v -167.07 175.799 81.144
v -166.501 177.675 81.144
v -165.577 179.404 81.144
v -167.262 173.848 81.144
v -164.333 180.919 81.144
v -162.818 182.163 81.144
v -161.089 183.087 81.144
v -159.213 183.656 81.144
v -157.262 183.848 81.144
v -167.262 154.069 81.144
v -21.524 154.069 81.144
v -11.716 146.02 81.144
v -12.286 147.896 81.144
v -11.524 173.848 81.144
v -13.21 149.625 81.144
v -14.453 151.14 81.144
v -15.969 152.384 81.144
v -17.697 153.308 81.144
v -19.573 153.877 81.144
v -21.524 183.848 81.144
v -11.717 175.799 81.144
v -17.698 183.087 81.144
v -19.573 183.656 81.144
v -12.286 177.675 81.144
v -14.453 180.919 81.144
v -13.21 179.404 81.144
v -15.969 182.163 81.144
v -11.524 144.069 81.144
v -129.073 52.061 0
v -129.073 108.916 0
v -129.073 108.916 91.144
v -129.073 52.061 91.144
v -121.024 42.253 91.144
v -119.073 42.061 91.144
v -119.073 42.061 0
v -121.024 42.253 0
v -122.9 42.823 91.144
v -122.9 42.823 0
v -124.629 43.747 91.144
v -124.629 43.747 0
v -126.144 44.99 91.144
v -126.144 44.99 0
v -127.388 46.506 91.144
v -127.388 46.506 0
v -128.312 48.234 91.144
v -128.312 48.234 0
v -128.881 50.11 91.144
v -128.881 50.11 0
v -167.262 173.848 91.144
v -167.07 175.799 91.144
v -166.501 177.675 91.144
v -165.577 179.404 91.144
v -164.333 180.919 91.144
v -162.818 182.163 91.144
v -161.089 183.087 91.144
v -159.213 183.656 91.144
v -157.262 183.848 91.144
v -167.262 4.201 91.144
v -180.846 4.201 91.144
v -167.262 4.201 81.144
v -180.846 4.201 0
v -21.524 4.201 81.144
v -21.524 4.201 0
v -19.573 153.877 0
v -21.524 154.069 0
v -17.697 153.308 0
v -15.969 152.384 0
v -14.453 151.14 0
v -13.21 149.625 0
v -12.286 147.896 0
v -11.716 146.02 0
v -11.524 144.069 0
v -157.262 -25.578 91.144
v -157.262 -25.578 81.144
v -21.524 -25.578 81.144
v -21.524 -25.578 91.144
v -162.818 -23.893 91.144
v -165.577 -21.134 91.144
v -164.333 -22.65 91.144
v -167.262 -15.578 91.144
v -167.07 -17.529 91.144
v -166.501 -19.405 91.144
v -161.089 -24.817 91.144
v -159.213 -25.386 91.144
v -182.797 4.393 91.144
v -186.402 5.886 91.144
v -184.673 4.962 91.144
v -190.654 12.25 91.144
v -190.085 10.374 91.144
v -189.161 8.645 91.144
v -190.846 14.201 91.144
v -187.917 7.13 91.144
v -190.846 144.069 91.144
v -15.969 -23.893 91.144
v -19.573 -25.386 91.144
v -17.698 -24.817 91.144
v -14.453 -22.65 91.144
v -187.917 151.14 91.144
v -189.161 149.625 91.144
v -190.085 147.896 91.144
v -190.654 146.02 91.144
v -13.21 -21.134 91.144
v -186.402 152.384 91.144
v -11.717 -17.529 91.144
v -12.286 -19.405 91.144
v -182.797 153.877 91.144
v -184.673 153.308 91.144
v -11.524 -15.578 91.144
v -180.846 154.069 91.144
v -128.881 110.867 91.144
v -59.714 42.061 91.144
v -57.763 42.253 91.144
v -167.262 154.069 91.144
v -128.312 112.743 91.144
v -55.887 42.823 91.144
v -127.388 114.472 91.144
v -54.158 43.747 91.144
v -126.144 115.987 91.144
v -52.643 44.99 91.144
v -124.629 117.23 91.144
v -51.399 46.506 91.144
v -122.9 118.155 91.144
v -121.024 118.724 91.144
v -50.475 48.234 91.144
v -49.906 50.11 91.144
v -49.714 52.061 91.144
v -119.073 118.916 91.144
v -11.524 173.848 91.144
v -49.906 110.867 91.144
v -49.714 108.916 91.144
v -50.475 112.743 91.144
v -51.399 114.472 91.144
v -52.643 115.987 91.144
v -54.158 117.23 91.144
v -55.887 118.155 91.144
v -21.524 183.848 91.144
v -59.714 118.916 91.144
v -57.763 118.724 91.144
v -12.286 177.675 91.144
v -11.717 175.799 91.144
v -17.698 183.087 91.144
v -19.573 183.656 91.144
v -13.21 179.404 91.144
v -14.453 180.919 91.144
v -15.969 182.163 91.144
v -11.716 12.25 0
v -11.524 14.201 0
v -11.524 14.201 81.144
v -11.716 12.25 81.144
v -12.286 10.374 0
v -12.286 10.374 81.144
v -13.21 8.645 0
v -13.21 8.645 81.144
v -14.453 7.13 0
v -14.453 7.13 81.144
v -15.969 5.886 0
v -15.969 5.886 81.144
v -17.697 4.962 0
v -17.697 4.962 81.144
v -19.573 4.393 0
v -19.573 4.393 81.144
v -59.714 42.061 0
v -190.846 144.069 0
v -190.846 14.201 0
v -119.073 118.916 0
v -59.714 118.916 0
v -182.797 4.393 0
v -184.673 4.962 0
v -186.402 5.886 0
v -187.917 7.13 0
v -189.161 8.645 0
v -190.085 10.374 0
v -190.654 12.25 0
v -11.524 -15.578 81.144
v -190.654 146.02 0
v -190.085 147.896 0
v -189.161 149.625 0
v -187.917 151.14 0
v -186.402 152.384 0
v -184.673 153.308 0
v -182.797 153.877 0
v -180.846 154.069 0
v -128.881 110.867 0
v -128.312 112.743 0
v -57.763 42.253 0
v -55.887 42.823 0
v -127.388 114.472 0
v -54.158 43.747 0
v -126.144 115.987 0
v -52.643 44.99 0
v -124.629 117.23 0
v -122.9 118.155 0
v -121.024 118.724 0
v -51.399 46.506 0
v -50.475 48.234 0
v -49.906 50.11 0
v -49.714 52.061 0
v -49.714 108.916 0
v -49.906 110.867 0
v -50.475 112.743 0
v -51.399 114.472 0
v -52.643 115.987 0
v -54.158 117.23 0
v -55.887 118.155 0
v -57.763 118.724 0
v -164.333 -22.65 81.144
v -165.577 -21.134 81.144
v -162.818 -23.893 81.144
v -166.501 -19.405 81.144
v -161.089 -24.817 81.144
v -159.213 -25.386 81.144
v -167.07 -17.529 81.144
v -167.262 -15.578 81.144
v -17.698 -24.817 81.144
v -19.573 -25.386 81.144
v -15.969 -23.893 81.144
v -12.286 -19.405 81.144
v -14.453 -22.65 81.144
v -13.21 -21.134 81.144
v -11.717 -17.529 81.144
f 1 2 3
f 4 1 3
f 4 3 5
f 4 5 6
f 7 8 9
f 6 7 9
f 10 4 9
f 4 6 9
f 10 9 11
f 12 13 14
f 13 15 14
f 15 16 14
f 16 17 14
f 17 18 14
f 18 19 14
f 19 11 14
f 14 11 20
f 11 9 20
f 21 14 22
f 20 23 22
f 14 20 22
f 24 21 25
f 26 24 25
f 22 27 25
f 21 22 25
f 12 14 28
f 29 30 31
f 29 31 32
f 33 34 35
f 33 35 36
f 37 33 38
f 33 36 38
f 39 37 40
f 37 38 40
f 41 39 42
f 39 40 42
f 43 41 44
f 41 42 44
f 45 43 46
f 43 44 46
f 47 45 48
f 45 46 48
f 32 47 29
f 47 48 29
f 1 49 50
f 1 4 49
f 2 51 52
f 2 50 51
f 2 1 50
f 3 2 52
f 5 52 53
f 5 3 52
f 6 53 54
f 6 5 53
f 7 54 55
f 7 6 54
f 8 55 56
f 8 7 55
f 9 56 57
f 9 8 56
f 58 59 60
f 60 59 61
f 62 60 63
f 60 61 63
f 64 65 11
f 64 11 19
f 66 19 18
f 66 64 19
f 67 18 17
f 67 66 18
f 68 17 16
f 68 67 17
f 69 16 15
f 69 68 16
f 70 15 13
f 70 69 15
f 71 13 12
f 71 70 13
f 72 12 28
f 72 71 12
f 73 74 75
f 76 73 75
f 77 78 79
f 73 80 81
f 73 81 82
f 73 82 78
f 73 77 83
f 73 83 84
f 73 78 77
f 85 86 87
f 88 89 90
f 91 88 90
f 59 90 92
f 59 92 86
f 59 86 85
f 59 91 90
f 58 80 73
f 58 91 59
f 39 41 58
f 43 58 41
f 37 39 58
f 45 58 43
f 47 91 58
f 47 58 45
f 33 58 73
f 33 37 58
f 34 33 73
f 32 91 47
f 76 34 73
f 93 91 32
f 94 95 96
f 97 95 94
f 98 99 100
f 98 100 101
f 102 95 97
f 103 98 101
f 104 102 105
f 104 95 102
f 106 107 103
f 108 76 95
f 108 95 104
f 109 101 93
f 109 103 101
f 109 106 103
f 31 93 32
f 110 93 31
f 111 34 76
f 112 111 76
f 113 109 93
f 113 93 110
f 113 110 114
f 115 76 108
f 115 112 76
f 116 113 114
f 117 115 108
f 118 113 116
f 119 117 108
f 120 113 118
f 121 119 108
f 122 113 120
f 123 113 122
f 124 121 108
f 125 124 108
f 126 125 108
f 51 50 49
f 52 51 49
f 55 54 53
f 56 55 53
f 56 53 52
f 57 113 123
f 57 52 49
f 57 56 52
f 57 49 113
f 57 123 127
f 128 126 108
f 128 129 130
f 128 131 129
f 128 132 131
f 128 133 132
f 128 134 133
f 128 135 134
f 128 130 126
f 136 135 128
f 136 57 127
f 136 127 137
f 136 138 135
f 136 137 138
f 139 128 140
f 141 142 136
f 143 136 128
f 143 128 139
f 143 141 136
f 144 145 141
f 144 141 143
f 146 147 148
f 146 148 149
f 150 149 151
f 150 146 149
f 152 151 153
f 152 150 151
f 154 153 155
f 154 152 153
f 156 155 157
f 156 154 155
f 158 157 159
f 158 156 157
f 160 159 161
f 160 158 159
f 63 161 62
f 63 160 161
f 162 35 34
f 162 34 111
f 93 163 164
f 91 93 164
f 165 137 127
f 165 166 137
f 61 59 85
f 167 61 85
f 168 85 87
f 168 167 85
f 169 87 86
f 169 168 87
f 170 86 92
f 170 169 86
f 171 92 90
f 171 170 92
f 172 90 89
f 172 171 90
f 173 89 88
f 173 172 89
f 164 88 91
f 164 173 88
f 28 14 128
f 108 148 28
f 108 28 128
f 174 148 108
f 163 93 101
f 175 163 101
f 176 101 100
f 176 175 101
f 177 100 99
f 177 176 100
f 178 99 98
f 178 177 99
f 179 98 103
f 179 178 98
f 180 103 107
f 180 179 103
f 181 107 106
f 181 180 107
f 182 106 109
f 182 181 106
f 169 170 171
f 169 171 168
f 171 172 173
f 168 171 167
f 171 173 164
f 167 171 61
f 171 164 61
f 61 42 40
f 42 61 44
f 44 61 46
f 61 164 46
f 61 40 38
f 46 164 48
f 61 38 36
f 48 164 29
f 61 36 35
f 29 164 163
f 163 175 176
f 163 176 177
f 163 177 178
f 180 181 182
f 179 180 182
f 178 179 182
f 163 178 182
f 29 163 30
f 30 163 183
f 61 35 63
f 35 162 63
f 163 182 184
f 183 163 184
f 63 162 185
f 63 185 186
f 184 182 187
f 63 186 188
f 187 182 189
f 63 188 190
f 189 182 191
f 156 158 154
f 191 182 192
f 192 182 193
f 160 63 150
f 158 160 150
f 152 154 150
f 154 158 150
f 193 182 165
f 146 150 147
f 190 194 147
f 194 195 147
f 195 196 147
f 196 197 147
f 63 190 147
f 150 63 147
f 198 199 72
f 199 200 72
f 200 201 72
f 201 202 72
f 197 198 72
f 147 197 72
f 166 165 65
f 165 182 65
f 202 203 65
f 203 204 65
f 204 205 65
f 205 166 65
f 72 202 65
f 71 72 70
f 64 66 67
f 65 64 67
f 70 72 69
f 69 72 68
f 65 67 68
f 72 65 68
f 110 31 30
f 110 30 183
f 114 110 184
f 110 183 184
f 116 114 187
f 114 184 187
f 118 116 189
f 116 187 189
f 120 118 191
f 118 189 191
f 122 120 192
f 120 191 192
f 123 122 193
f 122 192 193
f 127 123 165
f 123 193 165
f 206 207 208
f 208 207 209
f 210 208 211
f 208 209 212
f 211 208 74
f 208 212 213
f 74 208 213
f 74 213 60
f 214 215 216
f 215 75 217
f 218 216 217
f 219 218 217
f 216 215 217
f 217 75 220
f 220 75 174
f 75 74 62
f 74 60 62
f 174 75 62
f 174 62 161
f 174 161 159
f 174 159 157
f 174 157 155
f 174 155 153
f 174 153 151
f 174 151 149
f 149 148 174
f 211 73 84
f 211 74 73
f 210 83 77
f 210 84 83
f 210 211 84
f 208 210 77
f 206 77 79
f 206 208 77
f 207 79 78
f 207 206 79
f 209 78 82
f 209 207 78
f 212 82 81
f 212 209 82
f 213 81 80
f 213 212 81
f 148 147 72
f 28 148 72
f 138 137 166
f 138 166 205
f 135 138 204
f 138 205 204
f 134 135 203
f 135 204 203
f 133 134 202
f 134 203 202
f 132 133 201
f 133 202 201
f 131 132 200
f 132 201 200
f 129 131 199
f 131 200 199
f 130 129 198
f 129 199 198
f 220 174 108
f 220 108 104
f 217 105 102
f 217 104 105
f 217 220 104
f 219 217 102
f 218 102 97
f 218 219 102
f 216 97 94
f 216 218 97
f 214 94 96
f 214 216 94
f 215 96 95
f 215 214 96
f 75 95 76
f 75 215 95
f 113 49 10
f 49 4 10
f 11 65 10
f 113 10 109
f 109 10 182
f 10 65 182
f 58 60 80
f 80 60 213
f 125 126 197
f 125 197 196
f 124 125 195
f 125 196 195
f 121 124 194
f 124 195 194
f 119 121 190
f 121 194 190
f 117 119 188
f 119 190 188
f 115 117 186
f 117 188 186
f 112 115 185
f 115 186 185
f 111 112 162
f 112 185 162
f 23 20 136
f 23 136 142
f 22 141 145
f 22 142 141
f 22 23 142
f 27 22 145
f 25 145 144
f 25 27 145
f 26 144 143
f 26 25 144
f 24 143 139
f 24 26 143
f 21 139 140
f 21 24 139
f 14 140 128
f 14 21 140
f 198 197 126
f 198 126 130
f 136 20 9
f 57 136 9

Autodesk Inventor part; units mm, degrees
ref_plane "YZ Plane" through (0, 0, 0) normal (1, 0, 0) x (0, 1, 0)
ref_plane "XZ Plane" through (0, 0, 0) normal (0, 1, 0) x (-1, 0, 0)
ref_plane "XY Plane" through (0, 0, 0) normal (0, 0, 1) x (1, 0, 0)
ref_plane "Work Plane1" through (0, 0, 0) normal (0, 0, 1) x (1, 0, 0)
sketch "Sketch1" plane through (0, 0, 0) normal (0, 0, 1) x (1, 0, 0)
  line L0 (-199.8571, 167.3322) -> (-0.3512, 153.2823) projected
  line L1 (-199.8571, 167.3322) -> (-212.6962, -14.9789) projected
  line L2 (-204.4935, -14.4012) -> (-212.6962, -14.9789) projected
  arc A0 (-204.4935, -14.4012) -> (-199.8571, -9.0623) centre (-204.8448, -9.4136) ccw projected
  line L3 (-0.3512, 4.9876) -> (-199.8571, -9.0623) projected
  line L4 (-0.3512, 4.9876) -> (-5.573, 79.1349) projected
  line L5 (-0.3512, 153.2823) -> (-5.573, 79.1349) projected
  line L6 (-21.5243, 154.0691) -> (-180.8464, 154.0691)
  line L7 (-190.8464, 144.0691) -> (-190.8464, 14.2008)
  line L8 (-180.8464, 4.2008) -> (-21.5243, 4.2008)
  line L9 (-11.5243, 14.2008) -> (-11.5243, 144.0691)
  circle A1 centre (-89.3933, 80.4886) radius 30.8095 projected
  line L10 (-59.7137, 118.9158) -> (-119.0729, 118.9158)
  line L11 (-129.0729, 108.9158) -> (-129.0729, 52.0613)
  line L12 (-119.0729, 42.0613) -> (-59.7137, 42.0613)
  line L13 (-49.7137, 52.0613) -> (-49.7137, 108.9158)
  line L14 (-49.7137, 118.9158) -> (-129.0729, 42.0613) construction
  line L15 (-129.0729, 118.9158) -> (-49.7137, 42.0613) construction
  arc A2 (-49.7137, 108.9158) -> (-59.7137, 118.9158) centre (-59.7137, 108.9158) ccw
  arc A3 (-59.7137, 42.0613) -> (-49.7137, 52.0613) centre (-59.7137, 52.0613) ccw
  arc A4 (-129.0729, 52.0613) -> (-119.0729, 42.0613) centre (-119.0729, 52.0613) ccw
  arc A5 (-119.0729, 118.9158) -> (-129.0729, 108.9158) centre (-119.0729, 108.9158) ccw
  arc A6 (-11.5243, 144.0691) -> (-21.5243, 154.0691) centre (-21.5243, 144.0691) ccw
  arc A7 (-21.5243, 4.2008) -> (-11.5243, 14.2008) centre (-21.5243, 14.2008) ccw
  arc A8 (-190.8464, 14.2008) -> (-180.8464, 4.2008) centre (-180.8464, 14.2008) ccw
  arc A9 (-180.8464, 154.0691) -> (-190.8464, 144.0691) centre (-180.8464, 144.0691) ccw
  point P0 (0, 0)
  point P1 (-11.5243, 154.0691)
  point P2 (-11.5243, 4.2008)
  dimension "d0" = 10
extrude "Extrusion1" add sketch "Sketch1" along normal up to surface (81.1444 mm away) contours A6 L9 A7 L8 A8 L7 A9 L6
sketch "Sketch2" plane through (-180.8464, 154.0691, 81.1444) normal (0, 0, 1) x (1, 0, 0)
  arc A0 (121.1327, -112.0078) -> (131.1327, -102.0078) centre (121.1327, -102.0078) ccw projected
  line L0 (61.7735, -112.0078) -> (121.1327, -112.0078) projected
  arc A1 (51.7735, -102.0078) -> (61.7735, -112.0078) centre (61.7735, -102.0078) ccw projected
  line L1 (51.7735, -45.1533) -> (51.7735, -102.0078) projected
  arc A2 (61.7735, -35.1533) -> (51.7735, -45.1533) centre (61.7735, -45.1533) ccw projected
  line L2 (121.1327, -35.1533) -> (61.7735, -35.1533) projected
  arc A3 (131.1327, -45.1533) -> (121.1327, -35.1533) centre (121.1327, -45.1533) ccw projected
  line L3 (131.1327, -102.0078) -> (131.1327, -45.1533) projected
  arc A4 (159.322, -149.8683) -> (169.322, -139.8683) centre (159.322, -139.8683) ccw projected
  line L4 (169.322, -10) -> (169.322, -139.8683) projected
  arc A5 (169.322, -10) -> (159.322, 0) centre (159.322, -10) ccw projected
  line L5 (0, 0) -> (159.322, 0) projected
  arc A6 (0, 0) -> (-10, -10) centre (0, -10) ccw projected
  line L6 (-10, -139.8683) -> (-10, -10) projected
  arc A7 (-10, -139.8683) -> (0, -149.8683) centre (0, -139.8683) ccw projected
  line L7 (159.322, -149.8683) -> (0, -149.8683) projected
  line L8 (23.5841, -179.6476) -> (159.322, -179.6476)
  line L9 (169.322, -169.6476) -> (169.322, 19.7793)
  line L10 (159.322, 29.7793) -> (23.5841, 29.7793)
  line L11 (13.5841, 19.7793) -> (13.5841, -169.6476)
  line L12 (13.5841, -179.6476) -> (169.322, 29.7793) construction
  line L13 (169.322, -179.6476) -> (13.5841, 29.7793) construction
  arc A8 (169.322, 19.7793) -> (159.322, 29.7793) centre (159.322, 19.7793) ccw
  arc A9 (23.5841, 29.7793) -> (13.5841, 19.7793) centre (23.5841, 19.7793) ccw
  arc A10 (13.5841, -169.6476) -> (23.5841, -179.6476) centre (23.5841, -169.6476) ccw
  arc A11 (159.322, -179.6476) -> (169.322, -169.6476) centre (159.322, -169.6476) ccw
  point P0 (180.8464, -154.0691)
  point P1 (91.4531, -74.9342)
  dimension "d3" = 10
extrude "Extrusion2" add sketch "Sketch2" along normal blind 10
properties part number "00_Axiovert_focusblock"
